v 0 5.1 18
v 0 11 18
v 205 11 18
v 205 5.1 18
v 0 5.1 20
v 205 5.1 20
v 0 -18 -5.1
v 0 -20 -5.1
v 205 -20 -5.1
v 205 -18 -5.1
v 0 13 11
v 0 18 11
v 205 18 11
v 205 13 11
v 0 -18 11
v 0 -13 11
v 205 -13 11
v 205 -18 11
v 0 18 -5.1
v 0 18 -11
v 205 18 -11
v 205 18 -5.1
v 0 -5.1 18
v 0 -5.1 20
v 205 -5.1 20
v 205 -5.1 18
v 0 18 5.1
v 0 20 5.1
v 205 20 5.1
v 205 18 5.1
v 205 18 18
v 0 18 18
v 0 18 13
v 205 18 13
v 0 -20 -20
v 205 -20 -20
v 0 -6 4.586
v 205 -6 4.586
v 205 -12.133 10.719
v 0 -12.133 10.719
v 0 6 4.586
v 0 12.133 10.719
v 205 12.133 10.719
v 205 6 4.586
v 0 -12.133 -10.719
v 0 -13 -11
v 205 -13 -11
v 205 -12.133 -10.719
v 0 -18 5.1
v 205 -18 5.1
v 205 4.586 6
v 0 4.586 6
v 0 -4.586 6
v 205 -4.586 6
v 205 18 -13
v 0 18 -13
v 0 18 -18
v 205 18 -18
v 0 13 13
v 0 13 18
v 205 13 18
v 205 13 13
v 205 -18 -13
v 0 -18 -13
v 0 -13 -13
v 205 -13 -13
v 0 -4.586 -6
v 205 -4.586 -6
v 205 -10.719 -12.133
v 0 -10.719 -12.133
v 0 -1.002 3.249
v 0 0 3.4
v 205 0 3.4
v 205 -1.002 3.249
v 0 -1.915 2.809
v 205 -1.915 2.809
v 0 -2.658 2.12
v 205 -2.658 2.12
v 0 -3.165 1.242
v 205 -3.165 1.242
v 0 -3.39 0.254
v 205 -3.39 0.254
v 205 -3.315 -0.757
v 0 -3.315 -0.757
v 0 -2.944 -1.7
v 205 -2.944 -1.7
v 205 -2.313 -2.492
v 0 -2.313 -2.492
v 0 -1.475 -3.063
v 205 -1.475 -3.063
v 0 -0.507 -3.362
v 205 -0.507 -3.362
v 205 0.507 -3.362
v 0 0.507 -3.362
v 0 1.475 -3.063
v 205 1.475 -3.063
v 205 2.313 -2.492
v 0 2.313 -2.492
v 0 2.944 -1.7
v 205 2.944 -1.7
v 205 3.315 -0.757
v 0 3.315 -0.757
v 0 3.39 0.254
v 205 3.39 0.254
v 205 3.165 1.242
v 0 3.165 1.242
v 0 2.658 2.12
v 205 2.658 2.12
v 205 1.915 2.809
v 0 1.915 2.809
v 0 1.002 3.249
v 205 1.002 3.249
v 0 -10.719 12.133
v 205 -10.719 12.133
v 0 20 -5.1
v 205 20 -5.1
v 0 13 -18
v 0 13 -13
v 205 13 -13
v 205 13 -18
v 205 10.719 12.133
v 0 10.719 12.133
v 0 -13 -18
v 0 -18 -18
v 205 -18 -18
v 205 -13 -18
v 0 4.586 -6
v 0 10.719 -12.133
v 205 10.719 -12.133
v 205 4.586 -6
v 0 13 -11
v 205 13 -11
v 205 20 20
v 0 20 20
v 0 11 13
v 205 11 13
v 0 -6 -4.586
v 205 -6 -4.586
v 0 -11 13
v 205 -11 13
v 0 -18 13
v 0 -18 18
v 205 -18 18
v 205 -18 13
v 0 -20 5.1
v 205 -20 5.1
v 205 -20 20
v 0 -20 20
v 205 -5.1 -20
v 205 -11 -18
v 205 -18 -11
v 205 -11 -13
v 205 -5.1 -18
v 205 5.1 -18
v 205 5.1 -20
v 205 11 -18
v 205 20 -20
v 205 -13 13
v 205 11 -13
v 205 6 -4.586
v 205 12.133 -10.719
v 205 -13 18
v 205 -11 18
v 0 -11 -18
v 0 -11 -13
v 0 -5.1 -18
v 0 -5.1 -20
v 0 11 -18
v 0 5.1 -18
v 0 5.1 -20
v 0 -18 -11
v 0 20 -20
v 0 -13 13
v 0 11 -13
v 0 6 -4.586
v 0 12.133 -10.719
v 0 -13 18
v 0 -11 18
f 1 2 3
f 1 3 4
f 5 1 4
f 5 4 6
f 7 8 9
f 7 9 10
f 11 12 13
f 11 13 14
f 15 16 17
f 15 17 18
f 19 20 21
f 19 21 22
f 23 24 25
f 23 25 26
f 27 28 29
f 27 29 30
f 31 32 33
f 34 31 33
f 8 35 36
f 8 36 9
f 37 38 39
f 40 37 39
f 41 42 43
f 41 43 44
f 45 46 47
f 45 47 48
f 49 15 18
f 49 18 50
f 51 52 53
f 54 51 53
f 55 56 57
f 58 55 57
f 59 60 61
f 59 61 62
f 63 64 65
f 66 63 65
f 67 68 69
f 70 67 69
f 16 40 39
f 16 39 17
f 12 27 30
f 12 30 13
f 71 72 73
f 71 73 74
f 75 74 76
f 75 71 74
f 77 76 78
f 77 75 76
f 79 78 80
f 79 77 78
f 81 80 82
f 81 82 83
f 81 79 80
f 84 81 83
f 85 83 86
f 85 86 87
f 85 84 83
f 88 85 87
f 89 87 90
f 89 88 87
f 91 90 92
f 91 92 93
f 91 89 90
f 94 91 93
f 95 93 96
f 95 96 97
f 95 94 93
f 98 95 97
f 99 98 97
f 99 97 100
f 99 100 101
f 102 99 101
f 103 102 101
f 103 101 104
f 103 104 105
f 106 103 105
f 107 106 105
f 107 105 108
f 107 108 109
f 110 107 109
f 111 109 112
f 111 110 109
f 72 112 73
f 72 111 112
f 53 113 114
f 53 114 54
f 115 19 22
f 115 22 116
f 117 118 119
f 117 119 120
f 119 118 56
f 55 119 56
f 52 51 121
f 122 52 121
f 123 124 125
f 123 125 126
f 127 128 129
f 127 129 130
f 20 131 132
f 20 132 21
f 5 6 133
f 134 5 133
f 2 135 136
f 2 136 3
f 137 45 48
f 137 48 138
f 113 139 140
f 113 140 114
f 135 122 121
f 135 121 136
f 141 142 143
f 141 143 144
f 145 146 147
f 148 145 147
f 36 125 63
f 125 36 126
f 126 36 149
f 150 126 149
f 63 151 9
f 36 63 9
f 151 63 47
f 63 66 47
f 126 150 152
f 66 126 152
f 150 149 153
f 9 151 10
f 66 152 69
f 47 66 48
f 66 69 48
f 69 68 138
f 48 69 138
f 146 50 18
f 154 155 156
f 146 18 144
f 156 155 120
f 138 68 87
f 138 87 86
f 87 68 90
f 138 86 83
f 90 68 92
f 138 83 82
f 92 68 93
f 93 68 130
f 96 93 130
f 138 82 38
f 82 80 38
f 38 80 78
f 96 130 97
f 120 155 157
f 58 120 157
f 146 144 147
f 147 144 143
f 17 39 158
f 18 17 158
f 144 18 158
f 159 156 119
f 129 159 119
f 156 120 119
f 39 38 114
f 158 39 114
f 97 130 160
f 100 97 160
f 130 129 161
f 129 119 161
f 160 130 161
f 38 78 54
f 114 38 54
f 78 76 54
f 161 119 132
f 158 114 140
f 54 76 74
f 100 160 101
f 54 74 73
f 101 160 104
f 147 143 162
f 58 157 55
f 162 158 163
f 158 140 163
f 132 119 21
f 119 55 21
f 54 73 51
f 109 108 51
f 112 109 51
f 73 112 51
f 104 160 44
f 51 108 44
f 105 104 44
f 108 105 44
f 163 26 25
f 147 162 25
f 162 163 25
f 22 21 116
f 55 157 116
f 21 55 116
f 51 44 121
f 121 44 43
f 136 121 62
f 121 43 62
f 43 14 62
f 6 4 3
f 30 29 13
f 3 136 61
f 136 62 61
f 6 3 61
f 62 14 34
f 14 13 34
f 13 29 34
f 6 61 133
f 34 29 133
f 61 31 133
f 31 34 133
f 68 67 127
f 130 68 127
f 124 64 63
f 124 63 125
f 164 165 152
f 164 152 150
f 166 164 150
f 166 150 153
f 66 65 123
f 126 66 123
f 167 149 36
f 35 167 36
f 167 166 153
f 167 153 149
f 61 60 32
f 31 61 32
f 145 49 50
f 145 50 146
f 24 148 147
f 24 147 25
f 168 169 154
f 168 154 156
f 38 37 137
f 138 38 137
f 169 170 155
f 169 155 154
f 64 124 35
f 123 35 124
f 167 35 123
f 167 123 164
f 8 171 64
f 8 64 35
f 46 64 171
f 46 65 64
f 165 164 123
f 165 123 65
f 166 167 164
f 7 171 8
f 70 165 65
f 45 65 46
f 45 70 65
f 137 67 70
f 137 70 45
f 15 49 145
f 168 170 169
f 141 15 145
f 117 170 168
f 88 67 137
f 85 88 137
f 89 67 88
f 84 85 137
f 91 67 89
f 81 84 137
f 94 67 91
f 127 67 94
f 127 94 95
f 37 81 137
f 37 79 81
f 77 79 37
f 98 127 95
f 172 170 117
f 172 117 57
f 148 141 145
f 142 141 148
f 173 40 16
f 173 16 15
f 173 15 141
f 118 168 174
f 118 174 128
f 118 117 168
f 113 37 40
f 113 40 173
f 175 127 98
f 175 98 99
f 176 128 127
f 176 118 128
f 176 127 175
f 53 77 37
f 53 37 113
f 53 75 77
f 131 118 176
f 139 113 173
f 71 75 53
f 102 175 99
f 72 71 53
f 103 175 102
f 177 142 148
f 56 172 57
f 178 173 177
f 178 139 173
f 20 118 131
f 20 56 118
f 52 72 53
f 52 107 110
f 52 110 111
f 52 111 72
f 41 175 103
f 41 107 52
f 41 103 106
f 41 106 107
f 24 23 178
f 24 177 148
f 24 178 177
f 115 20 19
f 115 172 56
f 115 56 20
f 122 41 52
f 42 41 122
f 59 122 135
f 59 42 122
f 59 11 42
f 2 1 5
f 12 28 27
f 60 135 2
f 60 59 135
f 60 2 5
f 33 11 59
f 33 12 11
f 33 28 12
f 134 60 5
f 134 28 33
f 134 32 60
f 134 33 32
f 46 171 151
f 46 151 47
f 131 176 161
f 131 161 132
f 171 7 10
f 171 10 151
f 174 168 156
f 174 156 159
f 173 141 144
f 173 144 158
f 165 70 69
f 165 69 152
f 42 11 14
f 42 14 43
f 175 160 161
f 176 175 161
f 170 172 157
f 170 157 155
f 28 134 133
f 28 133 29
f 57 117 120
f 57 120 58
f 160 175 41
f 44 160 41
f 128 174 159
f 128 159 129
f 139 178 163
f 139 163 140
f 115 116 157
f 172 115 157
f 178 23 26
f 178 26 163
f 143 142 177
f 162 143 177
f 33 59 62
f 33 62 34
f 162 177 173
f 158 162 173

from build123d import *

# Parameters (mm, degrees)
SKETCH_1_R      = 3.4
SKETCH_1_W      = 5
SKETCH_1_H      = 5
EXTRUDE_1_DEPTH = 205


with BuildPart() as part:
    # 草图1 → 凸台-拉伸1 (new body)
    with BuildSketch(Plane(origin=(0, 0, 0), x_dir=(0, 0, -1), z_dir=(1, 0, 0))):
        Polygon((0, 6), (4.585786438, 6), (10.718811909, 12.133025471), (11, 13), (11, 18), (5.1, 18), (5.1, 20), (20, 20), (20, 5.1), (18, 5.1), (18, 11), (13, 11), (12.133025471, 10.718811909), (6, 4.585786438), (6, 0), (6, -4.585786438), (12.133025471, -10.718811909), (13, -11), (18, -11), (18, -5.1), (20, -5.1), (20, -20), (5.1, -20), (5.1, -18), (11, -18), (11, -13), (10.718811909, -12.133025471), (4.585786438, -6), (0, -6), (-4.585786438, -6), (-10.718811909, -12.133025471), (-11, -13), (-11, -18), (-5.1, -18), (-5.1, -20), (-20, -20), (-20, -5.1), (-18, -5.1), (-18, -11), (-13, -11), (-12.133025471, -10.718811909), (-6, -4.585786438), (-6, 0), (-6, 4.585786438), (-12.133025471, 10.718811909), (-13, 11), (-18, 11), (-18, 5.1), (-20, 5.1), (-20, 20), (-5.1, 20), (-5.1, 18), (-11, 18), (-11, 13), (-10.718811909, 12.133025471), (-4.585786438, 6), align=None)
        with Locations(Location((0, 0, 0), (0, 0, 180))):
            Circle(SKETCH_1_R, mode=Mode.SUBTRACT)
        with Locations((15.5, -15.5)):
            Rectangle(SKETCH_1_W, SKETCH_1_H, mode=Mode.SUBTRACT)
        with Locations((15.5, 15.5)):
            Rectangle(SKETCH_1_W, SKETCH_1_H, mode=Mode.SUBTRACT)
        with Locations((-15.5, -15.5)):
            Rectangle(SKETCH_1_W, SKETCH_1_H, mode=Mode.SUBTRACT)
        with Locations((-15.5, 15.5)):
            Rectangle(SKETCH_1_W, SKETCH_1_H, mode=Mode.SUBTRACT)
    extrude(amount=EXTRUDE_1_DEPTH)


solid = part.part
